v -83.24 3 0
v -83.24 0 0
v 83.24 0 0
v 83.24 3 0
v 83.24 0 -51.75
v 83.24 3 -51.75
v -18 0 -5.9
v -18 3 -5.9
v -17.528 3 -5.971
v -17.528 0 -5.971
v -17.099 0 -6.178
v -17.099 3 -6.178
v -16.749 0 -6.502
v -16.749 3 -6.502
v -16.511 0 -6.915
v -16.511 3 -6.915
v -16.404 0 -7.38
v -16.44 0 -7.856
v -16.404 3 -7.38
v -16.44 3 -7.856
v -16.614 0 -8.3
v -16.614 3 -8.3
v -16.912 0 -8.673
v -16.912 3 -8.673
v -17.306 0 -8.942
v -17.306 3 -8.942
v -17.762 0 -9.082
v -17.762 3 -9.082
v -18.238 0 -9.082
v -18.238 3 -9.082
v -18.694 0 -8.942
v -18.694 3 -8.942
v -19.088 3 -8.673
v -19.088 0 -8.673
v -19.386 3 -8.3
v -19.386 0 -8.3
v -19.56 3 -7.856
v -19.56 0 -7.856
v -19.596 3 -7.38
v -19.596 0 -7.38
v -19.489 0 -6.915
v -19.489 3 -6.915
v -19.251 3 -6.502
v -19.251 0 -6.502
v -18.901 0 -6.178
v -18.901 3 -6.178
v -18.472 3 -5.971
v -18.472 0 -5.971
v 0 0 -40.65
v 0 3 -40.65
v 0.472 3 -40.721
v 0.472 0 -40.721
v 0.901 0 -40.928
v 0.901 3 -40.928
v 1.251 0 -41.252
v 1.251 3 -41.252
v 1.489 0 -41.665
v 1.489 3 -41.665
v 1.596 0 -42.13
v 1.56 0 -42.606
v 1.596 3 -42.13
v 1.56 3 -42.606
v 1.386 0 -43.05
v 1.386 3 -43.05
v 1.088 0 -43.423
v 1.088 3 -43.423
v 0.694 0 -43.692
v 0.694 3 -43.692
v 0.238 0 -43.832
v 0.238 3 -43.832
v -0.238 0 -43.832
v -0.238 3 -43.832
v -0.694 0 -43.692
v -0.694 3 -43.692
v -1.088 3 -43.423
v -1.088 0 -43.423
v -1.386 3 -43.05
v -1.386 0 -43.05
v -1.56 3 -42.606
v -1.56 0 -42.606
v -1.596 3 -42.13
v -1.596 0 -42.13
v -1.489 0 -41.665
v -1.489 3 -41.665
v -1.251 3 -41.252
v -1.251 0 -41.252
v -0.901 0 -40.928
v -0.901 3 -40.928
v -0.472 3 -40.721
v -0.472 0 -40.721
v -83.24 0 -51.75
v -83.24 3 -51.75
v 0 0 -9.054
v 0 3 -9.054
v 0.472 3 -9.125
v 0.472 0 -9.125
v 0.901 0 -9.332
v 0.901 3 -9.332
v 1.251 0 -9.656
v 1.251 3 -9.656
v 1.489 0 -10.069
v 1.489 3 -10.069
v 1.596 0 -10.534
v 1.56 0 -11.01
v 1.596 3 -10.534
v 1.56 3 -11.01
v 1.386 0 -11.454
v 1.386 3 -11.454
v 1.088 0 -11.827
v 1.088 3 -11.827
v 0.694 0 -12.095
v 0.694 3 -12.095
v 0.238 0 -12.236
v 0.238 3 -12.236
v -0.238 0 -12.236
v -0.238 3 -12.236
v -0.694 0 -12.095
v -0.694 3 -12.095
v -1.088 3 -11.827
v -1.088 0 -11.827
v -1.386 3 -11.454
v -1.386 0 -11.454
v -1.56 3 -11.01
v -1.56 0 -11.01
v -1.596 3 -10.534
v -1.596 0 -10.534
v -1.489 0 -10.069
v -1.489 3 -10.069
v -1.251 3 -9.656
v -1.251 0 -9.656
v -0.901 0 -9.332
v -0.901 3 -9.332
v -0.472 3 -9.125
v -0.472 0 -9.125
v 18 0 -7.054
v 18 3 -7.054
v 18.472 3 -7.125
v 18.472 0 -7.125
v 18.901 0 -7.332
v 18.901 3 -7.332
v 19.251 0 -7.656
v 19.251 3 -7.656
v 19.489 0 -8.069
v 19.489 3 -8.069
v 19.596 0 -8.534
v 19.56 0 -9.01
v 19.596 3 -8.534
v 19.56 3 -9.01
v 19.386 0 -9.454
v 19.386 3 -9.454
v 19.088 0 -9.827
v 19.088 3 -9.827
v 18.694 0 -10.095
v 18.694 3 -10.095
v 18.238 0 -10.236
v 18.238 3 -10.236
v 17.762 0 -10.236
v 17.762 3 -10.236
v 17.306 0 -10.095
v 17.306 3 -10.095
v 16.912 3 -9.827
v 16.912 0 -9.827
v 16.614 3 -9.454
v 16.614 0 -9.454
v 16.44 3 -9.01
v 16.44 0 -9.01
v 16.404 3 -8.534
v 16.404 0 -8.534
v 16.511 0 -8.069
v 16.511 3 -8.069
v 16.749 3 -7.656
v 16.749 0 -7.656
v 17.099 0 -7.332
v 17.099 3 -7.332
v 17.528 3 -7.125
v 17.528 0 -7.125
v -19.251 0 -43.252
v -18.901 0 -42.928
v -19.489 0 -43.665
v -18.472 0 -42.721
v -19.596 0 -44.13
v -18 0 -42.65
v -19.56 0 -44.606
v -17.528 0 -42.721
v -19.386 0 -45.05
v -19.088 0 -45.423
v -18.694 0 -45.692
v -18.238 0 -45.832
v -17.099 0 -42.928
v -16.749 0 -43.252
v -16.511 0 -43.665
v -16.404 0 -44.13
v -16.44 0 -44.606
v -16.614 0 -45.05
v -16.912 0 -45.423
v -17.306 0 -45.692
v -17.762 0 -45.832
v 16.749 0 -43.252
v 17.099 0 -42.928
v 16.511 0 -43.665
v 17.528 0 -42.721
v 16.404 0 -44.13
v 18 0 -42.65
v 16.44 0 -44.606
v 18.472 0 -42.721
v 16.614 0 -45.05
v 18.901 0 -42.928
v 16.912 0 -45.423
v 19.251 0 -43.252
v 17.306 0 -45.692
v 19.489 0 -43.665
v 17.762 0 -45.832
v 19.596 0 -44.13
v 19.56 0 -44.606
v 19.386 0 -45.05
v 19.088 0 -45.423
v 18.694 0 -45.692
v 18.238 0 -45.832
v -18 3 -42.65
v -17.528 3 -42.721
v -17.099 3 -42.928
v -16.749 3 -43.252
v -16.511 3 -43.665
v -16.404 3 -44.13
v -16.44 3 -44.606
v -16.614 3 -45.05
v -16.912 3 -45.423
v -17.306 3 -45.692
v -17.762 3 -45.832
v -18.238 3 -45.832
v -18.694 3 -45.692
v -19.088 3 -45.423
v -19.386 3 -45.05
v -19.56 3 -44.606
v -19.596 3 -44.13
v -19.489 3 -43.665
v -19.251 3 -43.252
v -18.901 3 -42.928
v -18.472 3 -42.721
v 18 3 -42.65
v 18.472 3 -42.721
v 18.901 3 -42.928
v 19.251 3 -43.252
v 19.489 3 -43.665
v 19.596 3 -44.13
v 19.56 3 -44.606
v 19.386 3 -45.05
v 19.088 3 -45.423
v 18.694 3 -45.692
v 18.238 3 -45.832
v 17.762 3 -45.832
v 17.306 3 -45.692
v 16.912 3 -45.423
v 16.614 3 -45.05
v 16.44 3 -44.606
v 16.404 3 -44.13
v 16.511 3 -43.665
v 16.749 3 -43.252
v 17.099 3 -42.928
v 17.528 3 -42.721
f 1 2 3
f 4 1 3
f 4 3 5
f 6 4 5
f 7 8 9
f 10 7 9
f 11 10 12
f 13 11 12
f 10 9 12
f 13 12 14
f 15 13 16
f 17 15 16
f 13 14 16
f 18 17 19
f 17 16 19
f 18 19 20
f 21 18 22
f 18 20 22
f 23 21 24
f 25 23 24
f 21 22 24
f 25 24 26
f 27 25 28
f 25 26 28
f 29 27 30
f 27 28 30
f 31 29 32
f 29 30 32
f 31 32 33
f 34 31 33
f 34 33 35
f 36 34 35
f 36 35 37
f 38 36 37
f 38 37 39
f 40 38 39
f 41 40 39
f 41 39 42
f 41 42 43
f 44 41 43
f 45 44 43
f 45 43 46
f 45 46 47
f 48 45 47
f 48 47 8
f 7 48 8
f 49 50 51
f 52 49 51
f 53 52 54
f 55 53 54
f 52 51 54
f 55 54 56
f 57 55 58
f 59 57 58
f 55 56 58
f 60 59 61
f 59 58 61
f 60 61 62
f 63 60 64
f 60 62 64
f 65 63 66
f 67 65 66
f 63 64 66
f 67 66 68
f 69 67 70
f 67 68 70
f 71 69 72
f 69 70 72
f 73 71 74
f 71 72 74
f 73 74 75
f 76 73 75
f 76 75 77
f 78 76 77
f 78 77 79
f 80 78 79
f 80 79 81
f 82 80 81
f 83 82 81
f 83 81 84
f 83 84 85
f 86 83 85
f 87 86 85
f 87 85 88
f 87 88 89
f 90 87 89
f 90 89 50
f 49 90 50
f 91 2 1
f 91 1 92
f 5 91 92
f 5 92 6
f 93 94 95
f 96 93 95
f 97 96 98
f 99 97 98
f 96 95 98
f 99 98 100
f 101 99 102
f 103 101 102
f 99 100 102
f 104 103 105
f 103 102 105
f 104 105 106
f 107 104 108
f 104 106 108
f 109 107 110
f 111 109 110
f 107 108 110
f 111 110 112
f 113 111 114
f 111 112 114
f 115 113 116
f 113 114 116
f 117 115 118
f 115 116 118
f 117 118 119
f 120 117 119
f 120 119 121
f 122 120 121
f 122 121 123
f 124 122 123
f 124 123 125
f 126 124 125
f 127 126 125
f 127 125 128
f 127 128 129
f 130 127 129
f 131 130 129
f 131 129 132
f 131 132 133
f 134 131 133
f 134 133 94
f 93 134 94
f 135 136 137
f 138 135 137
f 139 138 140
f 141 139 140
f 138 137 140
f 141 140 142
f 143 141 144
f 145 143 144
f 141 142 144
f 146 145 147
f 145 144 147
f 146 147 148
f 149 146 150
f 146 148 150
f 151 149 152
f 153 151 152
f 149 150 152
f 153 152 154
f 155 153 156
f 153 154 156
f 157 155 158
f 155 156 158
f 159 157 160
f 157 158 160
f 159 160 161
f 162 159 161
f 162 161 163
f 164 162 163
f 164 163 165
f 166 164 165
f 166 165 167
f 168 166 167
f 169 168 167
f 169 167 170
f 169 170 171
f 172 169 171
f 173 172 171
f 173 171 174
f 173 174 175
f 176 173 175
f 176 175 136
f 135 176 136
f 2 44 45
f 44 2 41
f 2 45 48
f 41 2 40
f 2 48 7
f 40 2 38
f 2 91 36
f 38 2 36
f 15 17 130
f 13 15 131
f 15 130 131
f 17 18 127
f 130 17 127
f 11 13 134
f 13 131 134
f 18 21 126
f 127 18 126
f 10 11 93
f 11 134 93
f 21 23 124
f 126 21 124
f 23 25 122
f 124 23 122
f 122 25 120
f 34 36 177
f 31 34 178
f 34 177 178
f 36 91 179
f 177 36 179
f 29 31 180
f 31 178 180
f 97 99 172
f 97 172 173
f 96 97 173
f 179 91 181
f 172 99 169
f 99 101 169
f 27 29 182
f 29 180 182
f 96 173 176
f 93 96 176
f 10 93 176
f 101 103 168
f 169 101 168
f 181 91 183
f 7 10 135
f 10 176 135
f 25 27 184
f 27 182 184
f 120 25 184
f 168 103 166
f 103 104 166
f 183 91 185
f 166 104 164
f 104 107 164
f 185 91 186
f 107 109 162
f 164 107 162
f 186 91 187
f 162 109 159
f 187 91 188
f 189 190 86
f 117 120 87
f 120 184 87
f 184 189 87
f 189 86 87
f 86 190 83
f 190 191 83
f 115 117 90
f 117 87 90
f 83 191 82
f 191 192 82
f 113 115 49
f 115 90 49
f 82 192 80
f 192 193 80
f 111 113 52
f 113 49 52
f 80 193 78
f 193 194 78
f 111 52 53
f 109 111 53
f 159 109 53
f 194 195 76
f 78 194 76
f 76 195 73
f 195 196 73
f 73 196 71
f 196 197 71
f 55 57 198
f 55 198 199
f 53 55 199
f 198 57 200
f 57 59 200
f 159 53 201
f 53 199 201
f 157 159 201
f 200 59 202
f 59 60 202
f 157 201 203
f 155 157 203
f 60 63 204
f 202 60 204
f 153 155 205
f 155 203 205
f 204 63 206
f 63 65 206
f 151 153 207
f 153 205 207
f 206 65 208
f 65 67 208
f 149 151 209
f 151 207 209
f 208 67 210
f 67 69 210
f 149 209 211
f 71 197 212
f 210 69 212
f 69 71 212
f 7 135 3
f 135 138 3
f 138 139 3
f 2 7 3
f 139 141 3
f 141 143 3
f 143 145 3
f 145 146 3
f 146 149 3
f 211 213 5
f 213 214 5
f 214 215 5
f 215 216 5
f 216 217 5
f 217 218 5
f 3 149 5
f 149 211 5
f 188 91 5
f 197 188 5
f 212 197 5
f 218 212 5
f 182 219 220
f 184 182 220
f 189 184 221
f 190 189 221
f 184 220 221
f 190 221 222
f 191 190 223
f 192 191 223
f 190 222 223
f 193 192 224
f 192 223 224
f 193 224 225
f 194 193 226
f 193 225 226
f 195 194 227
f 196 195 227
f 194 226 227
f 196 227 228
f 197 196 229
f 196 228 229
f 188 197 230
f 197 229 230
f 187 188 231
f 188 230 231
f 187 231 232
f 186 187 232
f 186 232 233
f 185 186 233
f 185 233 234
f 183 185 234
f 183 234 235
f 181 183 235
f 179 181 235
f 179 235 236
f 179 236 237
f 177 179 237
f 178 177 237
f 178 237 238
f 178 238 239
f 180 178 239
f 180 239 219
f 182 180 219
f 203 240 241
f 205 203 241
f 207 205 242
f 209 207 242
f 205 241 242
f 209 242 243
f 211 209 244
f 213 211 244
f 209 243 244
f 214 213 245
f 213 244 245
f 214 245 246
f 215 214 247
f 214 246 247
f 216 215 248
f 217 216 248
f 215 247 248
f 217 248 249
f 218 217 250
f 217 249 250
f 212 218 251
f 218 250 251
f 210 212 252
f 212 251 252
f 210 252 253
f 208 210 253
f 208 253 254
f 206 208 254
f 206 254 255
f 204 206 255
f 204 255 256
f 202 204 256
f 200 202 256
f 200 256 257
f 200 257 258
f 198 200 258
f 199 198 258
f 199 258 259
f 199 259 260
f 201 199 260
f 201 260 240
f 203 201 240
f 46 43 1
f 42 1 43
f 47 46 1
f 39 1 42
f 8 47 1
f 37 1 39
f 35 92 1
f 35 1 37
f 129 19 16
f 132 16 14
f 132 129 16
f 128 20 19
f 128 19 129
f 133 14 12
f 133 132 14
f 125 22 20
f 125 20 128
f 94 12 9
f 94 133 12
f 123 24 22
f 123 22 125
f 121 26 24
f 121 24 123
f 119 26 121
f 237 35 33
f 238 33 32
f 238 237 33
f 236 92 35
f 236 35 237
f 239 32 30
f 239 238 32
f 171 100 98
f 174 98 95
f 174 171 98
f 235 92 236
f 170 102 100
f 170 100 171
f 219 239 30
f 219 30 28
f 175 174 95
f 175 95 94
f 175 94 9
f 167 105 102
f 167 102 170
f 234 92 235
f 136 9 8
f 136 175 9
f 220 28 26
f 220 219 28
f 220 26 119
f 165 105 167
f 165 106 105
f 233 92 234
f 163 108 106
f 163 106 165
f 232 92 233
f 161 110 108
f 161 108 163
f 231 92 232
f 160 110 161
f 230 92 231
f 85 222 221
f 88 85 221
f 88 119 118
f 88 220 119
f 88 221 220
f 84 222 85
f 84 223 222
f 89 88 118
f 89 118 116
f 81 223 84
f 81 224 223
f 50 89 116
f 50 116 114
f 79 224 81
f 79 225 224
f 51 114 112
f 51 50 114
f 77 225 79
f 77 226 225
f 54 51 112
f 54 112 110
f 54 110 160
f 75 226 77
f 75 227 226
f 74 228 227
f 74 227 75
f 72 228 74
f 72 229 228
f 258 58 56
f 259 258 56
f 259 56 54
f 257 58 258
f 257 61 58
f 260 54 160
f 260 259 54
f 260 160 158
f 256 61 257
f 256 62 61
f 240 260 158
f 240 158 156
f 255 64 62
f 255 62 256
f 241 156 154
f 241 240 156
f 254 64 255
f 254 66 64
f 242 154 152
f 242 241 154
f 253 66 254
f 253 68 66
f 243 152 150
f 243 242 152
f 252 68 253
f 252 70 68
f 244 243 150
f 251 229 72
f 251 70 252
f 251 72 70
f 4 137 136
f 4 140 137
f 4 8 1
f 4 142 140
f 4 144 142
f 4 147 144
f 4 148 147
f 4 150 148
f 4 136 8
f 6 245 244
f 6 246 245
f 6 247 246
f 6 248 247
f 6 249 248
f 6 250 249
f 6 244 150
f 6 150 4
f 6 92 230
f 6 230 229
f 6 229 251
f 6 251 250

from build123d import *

# Parameters (mm, degrees)
SKETCH_1_W          = 166.48
SKETCH_1_H          = 51.75
EXTRUDE_1_DEPTH     = 3
SKETCH_3_R          = 1.6
CUT_EXTRUDE_2_DEPTH = 10
SKETCH_4_R          = 1.6
CUT_EXTRUDE_3_DEPTH = 10


with BuildPart() as part:
    # 草图1 → 凸台-拉伸1 (new body)
    with BuildSketch(Plane(origin=(0, 0, 0), x_dir=(1, 0, 0), z_dir=(0, 1, 0))):
        with Locations((0, 25.875)):
            Rectangle(SKETCH_1_W, SKETCH_1_H)
    extrude(amount=EXTRUDE_1_DEPTH)

    # 草图3 → 切除-拉伸2 (cut)
    with BuildSketch(Plane(origin=(0, 3, 0), x_dir=(1, 0, 0), z_dir=(0, 1, 0))):
        with Locations(Location((-18, 44.25, 0), (0, 0, 270))):
            Circle(SKETCH_3_R)
        with Locations(Location((0, 42.25, 0), (0, 0, 270))):
            Circle(SKETCH_3_R)
        with Locations(Location((18, 44.25, 0), (0, 0, 270))):
            Circle(SKETCH_3_R)
    extrude(amount=-CUT_EXTRUDE_2_DEPTH, mode=Mode.SUBTRACT)

    # 草图4 → 切除-拉伸3 (cut)
    with BuildSketch(Plane(origin=(0, 3, 0), x_dir=(1, 0, 0), z_dir=(0, 1, 0))):
        with Locations(Location((0, 10.65378949, 0), (0, 0, 270))):
            Circle(SKETCH_4_R)
        with Locations(Location((18, 8.65378949, 0), (0, 0, 270))):
            Circle(SKETCH_4_R)
        with Locations(Location((-18, 7.5, 0), (0, 0, 270))):
            Circle(SKETCH_4_R)
    extrude(amount=-CUT_EXTRUDE_3_DEPTH, mode=Mode.SUBTRACT)


solid = part.part
